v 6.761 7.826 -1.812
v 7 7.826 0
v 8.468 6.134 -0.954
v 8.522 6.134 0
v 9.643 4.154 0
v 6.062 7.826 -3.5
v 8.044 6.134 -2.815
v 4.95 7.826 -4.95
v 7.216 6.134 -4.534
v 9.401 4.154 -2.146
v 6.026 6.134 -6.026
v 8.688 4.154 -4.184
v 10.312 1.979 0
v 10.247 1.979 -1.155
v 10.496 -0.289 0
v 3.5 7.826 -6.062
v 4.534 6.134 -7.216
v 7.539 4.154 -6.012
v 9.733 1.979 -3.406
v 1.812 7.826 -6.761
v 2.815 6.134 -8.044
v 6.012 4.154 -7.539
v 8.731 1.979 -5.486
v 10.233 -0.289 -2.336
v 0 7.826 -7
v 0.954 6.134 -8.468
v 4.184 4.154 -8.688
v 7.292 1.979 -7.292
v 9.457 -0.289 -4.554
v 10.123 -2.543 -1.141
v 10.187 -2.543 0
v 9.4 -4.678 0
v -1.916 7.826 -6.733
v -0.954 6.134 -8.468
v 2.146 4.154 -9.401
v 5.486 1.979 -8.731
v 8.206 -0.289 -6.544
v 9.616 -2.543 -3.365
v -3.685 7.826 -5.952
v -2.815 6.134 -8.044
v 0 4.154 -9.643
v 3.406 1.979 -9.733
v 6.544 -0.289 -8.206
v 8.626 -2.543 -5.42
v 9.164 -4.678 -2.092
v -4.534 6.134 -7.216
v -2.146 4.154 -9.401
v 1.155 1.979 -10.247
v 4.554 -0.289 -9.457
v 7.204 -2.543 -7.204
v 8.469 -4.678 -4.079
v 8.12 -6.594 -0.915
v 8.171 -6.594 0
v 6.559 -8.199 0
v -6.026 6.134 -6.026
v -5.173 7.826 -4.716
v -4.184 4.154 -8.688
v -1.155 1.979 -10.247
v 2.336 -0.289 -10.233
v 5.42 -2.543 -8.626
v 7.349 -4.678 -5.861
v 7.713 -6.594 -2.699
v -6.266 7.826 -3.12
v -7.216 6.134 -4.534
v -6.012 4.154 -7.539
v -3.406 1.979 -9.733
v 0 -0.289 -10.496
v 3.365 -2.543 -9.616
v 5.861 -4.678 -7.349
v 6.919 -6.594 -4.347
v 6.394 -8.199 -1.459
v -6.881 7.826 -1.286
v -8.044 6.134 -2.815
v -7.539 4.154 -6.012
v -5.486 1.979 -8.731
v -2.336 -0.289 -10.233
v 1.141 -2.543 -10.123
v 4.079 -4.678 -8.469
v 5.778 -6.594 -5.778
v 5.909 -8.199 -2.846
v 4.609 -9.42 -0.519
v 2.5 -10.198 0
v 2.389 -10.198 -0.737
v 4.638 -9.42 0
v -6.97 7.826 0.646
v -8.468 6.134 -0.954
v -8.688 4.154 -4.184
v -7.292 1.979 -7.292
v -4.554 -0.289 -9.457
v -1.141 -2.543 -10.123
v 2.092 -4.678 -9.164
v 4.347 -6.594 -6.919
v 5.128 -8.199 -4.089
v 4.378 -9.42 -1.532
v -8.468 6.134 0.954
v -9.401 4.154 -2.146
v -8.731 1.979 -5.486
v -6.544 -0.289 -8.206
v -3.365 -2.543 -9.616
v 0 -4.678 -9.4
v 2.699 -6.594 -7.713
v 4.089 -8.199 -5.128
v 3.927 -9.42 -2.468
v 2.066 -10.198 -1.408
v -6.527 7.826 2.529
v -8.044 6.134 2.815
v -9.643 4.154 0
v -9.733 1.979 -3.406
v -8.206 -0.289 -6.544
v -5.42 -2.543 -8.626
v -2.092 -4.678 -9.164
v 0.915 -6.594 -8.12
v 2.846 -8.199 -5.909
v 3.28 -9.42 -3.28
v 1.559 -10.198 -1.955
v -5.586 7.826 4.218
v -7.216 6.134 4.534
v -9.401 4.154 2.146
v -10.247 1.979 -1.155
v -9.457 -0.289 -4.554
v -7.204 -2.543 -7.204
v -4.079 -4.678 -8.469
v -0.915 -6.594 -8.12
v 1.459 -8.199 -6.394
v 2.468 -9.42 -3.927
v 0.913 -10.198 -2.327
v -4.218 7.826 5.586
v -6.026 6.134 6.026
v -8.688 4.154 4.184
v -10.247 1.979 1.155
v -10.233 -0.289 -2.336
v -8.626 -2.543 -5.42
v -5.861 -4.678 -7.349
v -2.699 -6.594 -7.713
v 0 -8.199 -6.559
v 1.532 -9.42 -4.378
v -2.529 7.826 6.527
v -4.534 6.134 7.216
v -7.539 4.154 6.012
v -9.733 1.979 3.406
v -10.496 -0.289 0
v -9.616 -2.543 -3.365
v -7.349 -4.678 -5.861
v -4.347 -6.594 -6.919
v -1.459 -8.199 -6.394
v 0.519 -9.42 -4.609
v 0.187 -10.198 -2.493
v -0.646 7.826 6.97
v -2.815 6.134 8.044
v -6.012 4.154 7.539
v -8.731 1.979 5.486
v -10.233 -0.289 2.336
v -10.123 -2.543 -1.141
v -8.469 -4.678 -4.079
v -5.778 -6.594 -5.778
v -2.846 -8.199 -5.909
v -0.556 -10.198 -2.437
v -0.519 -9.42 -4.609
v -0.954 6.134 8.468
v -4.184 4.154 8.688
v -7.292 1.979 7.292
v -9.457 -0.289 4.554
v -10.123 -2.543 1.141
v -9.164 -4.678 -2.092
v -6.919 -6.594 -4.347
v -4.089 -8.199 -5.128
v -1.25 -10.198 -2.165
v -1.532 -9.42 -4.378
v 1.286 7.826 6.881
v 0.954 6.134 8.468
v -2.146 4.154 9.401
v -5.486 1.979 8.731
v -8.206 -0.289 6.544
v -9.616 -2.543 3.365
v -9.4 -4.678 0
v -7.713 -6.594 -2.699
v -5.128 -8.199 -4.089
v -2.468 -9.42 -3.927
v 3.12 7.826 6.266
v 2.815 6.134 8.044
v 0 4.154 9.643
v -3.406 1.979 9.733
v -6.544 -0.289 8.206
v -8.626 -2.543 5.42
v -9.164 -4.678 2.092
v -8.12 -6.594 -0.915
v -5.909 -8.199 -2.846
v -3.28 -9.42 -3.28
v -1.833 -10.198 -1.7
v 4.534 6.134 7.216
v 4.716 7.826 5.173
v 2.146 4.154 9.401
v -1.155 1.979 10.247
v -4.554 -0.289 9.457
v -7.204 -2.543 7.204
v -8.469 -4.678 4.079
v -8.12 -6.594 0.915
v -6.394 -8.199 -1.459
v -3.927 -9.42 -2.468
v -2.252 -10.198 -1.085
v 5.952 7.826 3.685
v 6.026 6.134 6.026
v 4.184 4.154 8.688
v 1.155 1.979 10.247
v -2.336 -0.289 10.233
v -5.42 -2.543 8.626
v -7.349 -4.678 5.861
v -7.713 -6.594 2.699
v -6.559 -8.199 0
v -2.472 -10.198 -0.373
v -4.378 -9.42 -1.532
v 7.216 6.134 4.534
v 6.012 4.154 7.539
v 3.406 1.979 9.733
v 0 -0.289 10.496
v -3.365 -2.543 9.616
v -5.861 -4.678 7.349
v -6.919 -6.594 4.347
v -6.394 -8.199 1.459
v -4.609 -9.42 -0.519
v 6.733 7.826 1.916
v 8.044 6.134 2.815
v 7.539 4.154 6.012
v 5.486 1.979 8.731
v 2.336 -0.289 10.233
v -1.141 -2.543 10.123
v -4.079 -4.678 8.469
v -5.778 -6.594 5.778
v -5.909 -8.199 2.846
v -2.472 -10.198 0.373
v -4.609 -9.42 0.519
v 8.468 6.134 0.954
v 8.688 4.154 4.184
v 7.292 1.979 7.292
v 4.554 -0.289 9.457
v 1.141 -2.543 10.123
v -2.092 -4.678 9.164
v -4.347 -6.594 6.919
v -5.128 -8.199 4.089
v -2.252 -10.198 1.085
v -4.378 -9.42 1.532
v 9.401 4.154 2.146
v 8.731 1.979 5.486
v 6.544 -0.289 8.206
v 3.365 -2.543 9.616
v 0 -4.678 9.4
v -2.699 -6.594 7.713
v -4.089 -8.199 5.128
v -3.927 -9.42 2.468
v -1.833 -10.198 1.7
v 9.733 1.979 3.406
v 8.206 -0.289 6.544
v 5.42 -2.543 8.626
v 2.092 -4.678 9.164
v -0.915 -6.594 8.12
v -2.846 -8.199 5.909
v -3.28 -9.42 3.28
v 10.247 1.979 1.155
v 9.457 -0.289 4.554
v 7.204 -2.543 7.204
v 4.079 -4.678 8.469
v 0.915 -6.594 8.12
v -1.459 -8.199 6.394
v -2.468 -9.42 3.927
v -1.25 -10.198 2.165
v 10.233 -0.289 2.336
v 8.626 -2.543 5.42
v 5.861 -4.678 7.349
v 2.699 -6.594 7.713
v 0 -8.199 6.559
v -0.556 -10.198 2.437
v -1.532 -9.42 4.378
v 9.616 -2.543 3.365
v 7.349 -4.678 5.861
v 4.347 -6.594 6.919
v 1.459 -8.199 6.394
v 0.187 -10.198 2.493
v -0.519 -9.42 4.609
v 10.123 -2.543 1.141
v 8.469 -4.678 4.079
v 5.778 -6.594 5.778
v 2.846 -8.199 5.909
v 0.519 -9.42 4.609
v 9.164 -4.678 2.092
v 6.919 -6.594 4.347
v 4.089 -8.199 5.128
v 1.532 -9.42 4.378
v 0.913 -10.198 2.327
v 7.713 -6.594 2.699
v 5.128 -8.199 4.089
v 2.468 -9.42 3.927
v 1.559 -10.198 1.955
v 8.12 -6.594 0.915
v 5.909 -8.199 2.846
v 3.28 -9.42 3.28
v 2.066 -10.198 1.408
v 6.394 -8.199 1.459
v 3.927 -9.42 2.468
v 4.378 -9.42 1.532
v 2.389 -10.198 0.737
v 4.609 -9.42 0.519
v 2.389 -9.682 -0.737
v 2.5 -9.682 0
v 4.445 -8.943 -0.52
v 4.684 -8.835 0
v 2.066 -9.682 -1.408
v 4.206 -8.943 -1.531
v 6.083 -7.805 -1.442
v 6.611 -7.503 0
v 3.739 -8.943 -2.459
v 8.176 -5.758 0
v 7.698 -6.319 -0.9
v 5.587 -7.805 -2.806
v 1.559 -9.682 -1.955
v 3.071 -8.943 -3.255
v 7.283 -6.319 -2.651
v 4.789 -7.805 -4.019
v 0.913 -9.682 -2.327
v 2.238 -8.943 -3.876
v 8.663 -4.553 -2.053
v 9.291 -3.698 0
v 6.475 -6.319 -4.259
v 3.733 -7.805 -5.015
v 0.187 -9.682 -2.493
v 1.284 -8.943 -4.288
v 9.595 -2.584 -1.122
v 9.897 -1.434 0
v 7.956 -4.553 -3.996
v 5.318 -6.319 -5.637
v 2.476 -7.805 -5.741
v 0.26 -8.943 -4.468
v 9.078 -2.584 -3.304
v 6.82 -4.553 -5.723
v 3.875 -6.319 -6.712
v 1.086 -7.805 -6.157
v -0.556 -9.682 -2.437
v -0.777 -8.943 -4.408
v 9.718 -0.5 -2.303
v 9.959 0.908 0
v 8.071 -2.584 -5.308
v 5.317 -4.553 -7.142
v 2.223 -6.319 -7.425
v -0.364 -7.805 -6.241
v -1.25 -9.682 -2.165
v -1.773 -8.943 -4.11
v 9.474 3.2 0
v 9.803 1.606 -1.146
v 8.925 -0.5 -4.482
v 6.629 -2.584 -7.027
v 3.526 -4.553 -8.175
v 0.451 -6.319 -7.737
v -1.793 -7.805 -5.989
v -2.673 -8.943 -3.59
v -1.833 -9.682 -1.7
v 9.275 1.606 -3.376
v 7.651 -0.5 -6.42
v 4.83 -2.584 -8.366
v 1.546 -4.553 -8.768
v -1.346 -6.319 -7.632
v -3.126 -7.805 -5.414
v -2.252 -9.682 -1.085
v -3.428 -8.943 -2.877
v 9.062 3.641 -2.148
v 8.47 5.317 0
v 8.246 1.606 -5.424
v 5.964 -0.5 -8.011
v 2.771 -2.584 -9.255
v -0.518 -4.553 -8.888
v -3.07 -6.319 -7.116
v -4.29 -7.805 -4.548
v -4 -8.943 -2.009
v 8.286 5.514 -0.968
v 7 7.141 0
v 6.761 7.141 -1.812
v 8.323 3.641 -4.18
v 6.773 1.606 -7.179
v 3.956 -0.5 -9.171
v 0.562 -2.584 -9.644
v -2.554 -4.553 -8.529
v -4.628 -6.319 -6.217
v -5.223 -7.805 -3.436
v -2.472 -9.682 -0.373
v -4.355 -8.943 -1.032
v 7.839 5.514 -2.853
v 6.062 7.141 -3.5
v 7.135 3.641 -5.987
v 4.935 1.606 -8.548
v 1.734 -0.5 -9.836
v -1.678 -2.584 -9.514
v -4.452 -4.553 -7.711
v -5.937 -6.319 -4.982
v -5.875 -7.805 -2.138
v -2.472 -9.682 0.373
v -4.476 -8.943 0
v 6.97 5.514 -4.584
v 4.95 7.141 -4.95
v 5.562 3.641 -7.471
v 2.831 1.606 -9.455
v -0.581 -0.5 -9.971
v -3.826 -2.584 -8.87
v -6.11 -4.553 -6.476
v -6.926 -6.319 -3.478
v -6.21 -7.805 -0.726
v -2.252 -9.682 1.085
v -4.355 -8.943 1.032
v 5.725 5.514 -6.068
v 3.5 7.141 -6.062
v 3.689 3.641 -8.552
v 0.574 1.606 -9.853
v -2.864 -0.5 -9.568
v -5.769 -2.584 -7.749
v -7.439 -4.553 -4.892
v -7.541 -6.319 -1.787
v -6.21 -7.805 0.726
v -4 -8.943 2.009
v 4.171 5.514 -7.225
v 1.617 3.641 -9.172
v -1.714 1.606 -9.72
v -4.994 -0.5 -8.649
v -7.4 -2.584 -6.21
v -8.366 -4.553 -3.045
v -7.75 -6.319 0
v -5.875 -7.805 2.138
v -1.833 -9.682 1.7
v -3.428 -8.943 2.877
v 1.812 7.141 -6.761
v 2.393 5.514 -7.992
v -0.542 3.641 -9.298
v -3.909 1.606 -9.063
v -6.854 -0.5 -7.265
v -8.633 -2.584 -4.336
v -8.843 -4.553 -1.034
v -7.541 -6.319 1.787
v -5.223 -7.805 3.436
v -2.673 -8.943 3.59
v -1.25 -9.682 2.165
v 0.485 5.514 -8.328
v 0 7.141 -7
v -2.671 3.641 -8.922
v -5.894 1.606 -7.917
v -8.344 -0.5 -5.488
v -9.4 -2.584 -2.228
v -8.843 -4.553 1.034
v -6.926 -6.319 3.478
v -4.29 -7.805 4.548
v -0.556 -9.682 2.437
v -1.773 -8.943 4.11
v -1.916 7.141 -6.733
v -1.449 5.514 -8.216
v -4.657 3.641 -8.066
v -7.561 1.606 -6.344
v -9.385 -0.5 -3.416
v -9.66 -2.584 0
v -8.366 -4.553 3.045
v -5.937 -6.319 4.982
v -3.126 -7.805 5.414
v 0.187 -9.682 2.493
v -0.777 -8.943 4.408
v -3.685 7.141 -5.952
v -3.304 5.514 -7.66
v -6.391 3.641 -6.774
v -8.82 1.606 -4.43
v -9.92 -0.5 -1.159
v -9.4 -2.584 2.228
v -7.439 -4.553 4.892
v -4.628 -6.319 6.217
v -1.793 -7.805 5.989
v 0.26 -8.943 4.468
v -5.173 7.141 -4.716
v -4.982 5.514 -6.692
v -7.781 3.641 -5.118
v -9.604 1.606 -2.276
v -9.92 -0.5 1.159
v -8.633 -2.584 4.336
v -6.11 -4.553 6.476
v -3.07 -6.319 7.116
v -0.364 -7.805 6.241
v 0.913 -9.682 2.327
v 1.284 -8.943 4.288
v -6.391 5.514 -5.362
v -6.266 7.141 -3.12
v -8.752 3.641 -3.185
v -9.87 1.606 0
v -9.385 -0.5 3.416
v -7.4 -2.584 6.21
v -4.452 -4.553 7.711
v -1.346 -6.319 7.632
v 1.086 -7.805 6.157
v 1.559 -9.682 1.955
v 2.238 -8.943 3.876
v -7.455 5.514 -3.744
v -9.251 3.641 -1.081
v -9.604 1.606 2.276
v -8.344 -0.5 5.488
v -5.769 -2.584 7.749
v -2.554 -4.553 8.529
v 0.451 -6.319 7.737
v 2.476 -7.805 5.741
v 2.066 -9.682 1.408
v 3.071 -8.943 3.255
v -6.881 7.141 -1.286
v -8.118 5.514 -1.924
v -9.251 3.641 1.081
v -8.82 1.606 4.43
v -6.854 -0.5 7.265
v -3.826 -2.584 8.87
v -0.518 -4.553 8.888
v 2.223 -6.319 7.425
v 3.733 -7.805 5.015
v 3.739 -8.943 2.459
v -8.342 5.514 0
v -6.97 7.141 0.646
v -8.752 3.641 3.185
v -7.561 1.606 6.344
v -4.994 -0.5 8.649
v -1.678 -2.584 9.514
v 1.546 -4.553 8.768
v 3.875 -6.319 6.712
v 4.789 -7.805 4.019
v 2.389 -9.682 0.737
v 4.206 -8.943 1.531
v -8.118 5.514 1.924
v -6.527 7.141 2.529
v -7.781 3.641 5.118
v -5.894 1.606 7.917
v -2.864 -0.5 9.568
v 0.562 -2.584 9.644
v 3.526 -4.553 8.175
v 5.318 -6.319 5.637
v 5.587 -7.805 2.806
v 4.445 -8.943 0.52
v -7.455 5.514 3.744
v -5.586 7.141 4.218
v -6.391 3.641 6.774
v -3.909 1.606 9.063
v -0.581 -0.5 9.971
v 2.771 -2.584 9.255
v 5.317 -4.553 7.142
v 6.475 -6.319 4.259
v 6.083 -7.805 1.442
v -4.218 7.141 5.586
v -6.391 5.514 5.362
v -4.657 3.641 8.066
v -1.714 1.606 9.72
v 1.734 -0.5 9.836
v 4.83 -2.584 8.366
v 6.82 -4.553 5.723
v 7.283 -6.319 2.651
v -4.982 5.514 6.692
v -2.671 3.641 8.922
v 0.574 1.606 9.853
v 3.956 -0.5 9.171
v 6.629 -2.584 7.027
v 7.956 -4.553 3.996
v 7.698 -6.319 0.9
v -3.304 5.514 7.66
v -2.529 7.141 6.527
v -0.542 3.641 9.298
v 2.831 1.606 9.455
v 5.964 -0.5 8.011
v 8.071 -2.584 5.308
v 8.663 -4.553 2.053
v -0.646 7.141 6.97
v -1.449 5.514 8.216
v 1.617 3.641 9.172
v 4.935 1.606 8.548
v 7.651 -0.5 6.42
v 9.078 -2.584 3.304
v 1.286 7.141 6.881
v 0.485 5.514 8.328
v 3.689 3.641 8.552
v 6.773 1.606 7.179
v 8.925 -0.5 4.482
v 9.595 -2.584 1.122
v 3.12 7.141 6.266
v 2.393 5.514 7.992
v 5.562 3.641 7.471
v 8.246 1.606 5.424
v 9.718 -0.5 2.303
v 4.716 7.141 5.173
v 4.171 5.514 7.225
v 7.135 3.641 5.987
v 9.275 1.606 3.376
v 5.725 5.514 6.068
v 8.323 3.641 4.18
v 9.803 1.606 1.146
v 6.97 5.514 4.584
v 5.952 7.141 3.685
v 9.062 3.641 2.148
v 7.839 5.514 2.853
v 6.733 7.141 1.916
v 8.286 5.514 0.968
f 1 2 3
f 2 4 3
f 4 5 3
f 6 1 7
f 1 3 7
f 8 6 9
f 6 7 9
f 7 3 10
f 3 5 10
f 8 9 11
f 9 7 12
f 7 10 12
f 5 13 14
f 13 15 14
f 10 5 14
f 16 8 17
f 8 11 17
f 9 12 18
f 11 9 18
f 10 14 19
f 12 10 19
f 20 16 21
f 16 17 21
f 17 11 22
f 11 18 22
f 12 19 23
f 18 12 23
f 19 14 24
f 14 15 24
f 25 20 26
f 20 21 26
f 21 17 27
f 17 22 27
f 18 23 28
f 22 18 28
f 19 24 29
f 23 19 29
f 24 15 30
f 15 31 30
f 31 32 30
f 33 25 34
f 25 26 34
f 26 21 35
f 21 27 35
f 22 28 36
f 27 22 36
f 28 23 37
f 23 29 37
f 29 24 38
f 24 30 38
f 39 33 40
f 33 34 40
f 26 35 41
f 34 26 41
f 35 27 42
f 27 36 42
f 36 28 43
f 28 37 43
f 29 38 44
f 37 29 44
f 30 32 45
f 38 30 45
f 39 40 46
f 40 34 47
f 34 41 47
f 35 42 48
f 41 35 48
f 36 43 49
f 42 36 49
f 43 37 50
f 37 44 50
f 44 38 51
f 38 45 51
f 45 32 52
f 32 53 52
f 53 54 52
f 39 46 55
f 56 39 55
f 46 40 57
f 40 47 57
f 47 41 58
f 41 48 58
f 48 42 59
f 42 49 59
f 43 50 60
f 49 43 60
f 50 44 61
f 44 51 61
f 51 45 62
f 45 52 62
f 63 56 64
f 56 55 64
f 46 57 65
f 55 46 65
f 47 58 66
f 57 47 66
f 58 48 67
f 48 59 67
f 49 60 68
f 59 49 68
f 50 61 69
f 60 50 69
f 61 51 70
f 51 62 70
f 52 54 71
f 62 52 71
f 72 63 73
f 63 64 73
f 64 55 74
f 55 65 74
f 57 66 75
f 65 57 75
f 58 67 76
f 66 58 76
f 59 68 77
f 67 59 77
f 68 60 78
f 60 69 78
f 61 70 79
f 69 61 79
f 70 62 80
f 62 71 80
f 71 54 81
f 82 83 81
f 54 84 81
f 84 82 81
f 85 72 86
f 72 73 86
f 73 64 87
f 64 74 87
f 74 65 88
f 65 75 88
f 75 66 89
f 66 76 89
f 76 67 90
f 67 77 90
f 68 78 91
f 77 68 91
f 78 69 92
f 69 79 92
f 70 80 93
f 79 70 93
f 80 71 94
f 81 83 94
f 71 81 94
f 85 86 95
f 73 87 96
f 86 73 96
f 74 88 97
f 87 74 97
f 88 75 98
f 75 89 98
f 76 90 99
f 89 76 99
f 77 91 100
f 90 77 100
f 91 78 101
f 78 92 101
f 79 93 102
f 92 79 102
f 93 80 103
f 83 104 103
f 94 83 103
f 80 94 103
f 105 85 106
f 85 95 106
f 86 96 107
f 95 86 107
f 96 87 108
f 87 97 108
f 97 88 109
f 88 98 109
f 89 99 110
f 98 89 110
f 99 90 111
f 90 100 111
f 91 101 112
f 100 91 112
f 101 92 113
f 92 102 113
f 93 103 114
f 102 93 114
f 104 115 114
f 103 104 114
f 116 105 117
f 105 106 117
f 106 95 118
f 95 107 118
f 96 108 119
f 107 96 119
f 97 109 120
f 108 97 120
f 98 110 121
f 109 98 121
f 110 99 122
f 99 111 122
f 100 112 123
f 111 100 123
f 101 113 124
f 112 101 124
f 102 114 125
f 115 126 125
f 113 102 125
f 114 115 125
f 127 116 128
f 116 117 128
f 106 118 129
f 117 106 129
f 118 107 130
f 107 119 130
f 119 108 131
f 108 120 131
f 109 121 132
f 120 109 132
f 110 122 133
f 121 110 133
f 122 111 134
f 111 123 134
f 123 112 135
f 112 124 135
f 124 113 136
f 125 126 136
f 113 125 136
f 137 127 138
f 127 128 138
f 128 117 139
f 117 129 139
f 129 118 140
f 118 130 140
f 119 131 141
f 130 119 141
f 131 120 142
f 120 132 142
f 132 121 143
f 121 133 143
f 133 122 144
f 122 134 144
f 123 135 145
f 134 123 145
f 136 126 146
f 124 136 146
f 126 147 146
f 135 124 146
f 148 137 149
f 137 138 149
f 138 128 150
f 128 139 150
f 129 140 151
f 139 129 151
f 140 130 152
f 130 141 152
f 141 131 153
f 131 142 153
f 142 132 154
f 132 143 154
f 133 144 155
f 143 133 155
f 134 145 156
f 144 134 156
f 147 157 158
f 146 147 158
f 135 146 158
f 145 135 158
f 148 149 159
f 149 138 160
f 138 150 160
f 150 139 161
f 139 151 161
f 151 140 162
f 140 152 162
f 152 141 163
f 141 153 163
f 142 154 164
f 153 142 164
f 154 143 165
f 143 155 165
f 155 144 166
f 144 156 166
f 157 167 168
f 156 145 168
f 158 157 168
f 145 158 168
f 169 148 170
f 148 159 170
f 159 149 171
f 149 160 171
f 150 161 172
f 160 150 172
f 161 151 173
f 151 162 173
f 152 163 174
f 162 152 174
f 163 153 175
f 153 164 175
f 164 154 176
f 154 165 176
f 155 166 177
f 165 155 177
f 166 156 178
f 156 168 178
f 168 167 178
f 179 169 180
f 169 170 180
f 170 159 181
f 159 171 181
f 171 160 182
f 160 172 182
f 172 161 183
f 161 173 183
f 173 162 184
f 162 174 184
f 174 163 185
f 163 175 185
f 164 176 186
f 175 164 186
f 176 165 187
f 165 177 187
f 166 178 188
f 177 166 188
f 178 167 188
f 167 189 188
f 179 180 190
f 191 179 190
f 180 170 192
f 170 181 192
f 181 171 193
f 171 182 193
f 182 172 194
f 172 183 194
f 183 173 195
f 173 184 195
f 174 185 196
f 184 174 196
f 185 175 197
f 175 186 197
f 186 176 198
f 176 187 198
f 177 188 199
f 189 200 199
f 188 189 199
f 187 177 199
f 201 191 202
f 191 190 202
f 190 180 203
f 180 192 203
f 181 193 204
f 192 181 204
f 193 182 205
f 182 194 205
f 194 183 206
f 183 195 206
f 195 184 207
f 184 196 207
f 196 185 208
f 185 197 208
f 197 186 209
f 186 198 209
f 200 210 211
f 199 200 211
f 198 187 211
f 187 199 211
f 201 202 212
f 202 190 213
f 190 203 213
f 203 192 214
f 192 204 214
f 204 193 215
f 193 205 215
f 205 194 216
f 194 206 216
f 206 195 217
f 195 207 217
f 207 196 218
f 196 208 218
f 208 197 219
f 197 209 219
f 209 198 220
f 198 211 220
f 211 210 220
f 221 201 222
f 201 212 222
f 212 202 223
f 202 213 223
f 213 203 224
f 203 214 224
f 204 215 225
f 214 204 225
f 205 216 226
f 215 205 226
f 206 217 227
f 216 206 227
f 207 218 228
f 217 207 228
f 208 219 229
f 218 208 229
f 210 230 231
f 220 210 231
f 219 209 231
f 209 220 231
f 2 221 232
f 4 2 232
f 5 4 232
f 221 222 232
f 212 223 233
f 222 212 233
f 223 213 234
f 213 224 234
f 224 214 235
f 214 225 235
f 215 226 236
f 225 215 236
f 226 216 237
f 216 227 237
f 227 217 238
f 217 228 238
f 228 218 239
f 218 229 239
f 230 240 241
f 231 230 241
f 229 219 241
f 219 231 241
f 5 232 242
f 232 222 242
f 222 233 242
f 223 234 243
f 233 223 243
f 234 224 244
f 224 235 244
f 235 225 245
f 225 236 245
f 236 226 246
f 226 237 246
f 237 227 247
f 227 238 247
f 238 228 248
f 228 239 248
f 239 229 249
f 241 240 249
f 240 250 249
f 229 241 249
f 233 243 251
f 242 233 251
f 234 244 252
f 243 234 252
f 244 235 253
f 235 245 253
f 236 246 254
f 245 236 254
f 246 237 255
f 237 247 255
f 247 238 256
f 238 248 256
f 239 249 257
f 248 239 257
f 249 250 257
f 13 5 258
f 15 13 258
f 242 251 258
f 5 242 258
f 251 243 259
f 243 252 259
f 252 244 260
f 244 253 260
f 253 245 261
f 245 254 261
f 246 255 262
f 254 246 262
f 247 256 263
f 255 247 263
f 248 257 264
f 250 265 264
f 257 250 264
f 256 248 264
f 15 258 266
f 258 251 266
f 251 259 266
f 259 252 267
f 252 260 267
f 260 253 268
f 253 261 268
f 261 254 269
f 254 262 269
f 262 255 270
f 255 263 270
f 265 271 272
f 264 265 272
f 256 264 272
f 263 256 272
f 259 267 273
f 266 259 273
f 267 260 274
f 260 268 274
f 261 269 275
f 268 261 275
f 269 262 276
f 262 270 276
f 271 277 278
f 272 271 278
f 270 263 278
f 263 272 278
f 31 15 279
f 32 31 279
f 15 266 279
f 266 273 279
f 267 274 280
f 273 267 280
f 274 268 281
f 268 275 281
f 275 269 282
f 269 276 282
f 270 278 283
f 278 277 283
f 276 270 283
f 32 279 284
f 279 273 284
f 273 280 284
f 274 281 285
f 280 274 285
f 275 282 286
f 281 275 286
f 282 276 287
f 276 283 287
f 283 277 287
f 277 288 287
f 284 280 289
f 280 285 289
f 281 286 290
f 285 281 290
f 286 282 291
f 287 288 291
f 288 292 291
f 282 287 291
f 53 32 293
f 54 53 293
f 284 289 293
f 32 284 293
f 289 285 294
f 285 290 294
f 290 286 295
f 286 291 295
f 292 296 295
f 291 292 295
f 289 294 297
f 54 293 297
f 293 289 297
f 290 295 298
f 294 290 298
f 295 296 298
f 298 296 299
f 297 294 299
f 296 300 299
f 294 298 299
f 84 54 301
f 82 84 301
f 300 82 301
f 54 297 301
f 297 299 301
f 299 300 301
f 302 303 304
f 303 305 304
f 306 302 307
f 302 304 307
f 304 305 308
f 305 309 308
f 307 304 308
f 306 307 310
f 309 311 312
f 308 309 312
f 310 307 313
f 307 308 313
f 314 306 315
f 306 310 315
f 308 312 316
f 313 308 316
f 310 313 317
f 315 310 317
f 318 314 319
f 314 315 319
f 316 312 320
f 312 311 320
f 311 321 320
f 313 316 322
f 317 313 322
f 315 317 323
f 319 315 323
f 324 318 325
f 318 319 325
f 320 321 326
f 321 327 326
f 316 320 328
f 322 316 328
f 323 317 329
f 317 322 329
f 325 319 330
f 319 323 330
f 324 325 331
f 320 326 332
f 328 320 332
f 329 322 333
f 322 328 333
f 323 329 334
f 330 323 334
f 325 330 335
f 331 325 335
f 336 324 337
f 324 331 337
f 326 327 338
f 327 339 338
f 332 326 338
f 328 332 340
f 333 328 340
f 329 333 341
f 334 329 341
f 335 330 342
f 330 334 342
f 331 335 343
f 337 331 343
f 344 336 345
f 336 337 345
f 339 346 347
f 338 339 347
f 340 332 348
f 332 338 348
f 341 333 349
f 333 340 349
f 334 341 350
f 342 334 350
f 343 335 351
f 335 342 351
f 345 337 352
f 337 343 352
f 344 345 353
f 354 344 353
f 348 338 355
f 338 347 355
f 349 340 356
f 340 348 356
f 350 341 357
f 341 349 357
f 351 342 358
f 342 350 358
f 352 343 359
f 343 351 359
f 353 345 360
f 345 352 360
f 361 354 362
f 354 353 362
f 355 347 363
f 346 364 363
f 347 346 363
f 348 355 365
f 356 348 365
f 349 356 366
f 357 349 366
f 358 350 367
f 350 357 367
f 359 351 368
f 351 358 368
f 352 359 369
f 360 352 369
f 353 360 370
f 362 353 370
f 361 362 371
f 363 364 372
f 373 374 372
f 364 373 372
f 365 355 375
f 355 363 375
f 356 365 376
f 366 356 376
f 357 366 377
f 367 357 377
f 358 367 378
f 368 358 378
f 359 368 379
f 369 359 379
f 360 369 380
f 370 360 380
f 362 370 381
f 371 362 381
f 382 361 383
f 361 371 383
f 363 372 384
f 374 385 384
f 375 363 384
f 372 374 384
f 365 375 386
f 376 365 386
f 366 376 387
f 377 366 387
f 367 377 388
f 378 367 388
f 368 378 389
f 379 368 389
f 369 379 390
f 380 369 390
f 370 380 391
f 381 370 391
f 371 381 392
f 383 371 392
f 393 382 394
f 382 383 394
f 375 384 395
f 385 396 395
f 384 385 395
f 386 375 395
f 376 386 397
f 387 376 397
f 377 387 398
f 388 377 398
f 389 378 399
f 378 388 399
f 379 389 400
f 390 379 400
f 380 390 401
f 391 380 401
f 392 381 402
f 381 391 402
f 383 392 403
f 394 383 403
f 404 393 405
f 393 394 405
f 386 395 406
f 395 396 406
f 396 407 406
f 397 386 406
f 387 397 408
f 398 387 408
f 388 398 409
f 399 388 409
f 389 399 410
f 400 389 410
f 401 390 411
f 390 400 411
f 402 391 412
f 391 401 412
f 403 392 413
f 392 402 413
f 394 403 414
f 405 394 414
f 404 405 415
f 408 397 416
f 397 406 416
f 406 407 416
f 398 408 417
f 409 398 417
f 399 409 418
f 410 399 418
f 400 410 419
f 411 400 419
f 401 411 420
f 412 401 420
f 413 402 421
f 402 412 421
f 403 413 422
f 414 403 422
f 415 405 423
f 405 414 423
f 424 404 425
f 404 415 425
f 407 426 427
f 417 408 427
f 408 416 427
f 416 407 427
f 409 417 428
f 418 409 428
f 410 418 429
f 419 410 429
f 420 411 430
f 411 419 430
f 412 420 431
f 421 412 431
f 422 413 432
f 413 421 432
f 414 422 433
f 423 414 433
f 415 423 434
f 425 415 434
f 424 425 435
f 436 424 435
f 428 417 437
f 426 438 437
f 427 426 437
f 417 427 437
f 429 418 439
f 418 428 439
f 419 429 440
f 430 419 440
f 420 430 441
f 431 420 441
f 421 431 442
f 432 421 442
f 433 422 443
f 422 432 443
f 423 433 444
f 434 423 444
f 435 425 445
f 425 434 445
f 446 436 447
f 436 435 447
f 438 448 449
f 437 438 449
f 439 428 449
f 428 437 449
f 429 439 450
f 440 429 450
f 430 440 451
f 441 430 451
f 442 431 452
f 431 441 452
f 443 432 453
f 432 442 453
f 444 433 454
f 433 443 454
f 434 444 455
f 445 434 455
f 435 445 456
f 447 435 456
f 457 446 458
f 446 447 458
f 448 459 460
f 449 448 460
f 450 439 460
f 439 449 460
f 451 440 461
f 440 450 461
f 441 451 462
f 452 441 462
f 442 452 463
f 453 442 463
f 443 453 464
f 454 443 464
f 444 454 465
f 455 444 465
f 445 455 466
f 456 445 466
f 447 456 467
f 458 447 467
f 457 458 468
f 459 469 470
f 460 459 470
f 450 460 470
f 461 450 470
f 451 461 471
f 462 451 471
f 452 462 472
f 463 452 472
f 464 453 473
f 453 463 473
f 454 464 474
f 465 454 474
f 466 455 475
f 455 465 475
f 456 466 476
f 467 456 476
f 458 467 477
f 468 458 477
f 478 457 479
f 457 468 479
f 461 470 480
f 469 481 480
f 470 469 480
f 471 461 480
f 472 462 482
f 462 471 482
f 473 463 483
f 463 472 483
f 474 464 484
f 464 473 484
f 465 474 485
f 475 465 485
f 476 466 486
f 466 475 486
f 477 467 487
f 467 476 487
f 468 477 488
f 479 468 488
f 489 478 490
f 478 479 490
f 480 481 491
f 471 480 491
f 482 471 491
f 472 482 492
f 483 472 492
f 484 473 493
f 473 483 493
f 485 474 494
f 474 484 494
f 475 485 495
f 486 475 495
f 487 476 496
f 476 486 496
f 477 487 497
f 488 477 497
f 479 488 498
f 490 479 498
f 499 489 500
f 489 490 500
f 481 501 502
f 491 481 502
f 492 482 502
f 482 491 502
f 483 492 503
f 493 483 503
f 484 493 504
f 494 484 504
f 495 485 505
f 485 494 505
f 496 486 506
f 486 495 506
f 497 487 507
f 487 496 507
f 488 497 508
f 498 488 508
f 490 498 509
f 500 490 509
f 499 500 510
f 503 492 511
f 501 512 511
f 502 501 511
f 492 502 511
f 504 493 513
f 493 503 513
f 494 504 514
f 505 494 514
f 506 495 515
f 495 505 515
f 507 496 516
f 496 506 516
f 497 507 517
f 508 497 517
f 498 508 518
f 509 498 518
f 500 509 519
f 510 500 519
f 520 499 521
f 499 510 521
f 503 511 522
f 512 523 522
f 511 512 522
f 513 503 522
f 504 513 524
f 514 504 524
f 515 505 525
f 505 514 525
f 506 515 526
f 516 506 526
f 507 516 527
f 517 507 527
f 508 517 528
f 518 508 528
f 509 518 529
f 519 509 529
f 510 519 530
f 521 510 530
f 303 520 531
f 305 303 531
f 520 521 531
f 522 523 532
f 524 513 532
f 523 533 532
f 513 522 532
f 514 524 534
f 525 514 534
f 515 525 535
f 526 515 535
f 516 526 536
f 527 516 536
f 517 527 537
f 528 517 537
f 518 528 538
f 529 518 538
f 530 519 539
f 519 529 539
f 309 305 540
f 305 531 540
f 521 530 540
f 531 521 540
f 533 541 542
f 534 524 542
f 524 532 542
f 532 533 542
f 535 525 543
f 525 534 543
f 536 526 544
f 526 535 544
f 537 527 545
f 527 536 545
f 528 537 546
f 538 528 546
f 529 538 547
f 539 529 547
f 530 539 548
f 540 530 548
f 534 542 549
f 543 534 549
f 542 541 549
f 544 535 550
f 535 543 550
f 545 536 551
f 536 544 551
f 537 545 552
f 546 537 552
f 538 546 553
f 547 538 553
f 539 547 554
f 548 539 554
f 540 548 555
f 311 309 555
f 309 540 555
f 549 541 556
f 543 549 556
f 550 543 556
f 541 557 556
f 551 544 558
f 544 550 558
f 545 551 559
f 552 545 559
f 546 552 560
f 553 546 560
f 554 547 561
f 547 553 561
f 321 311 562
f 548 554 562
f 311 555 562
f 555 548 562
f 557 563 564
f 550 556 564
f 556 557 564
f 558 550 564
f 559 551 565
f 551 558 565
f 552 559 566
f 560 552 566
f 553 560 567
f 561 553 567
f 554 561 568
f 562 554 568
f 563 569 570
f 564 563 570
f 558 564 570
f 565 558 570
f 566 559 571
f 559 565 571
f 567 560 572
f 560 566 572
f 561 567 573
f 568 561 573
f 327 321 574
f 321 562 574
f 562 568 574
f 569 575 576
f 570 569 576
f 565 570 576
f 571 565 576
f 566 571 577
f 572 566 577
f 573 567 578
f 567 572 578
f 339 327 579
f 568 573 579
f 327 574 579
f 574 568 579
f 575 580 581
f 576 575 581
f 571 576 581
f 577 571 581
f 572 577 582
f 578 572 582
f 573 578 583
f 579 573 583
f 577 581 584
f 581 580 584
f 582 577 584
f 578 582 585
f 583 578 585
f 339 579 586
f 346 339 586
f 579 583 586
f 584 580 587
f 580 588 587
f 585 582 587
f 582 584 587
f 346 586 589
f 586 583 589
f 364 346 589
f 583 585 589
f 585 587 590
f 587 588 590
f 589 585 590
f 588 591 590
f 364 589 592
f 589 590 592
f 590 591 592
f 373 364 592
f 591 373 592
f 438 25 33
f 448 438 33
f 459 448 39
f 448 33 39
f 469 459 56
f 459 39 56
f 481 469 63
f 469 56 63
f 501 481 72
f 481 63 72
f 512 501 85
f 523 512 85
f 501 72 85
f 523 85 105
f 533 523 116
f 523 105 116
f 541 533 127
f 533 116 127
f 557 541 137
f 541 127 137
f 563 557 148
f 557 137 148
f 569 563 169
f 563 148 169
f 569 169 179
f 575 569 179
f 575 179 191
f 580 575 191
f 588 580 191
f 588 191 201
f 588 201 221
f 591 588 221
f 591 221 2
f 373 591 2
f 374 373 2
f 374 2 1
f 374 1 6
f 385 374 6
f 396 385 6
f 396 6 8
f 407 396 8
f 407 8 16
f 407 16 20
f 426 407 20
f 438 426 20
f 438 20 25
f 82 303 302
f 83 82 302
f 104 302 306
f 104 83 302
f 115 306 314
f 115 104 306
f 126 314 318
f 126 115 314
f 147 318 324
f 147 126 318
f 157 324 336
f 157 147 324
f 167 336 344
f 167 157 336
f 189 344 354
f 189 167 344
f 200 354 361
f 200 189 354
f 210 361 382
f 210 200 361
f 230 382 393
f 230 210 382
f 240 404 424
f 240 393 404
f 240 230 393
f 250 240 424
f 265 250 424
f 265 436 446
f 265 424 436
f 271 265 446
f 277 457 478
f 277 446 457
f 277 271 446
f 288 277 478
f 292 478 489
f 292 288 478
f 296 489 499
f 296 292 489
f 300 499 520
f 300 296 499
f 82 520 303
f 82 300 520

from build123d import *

# Parameters (mm, degrees)
SKETCH_2_R          = 7
CUT_EXTRUDE_1_DEPTH = 10
SKETCH_5_R          = 2.5
CUT_EXTRUDE_3_DEPTH = 10
CUT_EXTRUDE_START   = -10
SKETCH_6_R          = 2.5
CUT_EXTRUDE_4_DEPTH = 10


with BuildPart() as part:
    # 草图1 → 旋转1 (revolve)
    with BuildSketch(Plane.XY):
        with BuildLine():
            Line((0, -10.5), (0, -10))
            ThreePointArc((0, -10), (10, 0), (0, 10))
            Line((0, 10), (0, 10.5))
            ThreePointArc((0, 10.5), (10.5, 0), (0, -10.5))
        make_face()
    revolve(axis=Axis((0, 10, 0), (0, 1, 0)))

    # 草图2 → 切除-拉伸1 (cut)
    with BuildSketch(Plane(origin=(0, 10.5, 0), x_dir=(1, 0, 0), z_dir=(0, 1, 0))):
        with Locations(Location((0, 0, 0), (0, 0, 90))):
            Circle(SKETCH_2_R)
    extrude(amount=-CUT_EXTRUDE_1_DEPTH, mode=Mode.SUBTRACT)

    # 草图5 → 切除-拉伸3 (cut)
    with BuildSketch(Plane(origin=(0, -9.933965028, 0), x_dir=(1, 0, 0), z_dir=(0, 1, 0))):
        Circle(SKETCH_5_R)
    extrude(amount=CUT_EXTRUDE_3_DEPTH, mode=Mode.SUBTRACT)

    # 草图6 → 切除-拉伸4 (cut)
    with BuildSketch(Plane(origin=(0, -9.933965028, 0), x_dir=(1, 0, 0), z_dir=(0, 1, 0)).offset(CUT_EXTRUDE_START)):
        Circle(SKETCH_6_R)
    extrude(amount=CUT_EXTRUDE_4_DEPTH, mode=Mode.SUBTRACT)


solid = part.part
